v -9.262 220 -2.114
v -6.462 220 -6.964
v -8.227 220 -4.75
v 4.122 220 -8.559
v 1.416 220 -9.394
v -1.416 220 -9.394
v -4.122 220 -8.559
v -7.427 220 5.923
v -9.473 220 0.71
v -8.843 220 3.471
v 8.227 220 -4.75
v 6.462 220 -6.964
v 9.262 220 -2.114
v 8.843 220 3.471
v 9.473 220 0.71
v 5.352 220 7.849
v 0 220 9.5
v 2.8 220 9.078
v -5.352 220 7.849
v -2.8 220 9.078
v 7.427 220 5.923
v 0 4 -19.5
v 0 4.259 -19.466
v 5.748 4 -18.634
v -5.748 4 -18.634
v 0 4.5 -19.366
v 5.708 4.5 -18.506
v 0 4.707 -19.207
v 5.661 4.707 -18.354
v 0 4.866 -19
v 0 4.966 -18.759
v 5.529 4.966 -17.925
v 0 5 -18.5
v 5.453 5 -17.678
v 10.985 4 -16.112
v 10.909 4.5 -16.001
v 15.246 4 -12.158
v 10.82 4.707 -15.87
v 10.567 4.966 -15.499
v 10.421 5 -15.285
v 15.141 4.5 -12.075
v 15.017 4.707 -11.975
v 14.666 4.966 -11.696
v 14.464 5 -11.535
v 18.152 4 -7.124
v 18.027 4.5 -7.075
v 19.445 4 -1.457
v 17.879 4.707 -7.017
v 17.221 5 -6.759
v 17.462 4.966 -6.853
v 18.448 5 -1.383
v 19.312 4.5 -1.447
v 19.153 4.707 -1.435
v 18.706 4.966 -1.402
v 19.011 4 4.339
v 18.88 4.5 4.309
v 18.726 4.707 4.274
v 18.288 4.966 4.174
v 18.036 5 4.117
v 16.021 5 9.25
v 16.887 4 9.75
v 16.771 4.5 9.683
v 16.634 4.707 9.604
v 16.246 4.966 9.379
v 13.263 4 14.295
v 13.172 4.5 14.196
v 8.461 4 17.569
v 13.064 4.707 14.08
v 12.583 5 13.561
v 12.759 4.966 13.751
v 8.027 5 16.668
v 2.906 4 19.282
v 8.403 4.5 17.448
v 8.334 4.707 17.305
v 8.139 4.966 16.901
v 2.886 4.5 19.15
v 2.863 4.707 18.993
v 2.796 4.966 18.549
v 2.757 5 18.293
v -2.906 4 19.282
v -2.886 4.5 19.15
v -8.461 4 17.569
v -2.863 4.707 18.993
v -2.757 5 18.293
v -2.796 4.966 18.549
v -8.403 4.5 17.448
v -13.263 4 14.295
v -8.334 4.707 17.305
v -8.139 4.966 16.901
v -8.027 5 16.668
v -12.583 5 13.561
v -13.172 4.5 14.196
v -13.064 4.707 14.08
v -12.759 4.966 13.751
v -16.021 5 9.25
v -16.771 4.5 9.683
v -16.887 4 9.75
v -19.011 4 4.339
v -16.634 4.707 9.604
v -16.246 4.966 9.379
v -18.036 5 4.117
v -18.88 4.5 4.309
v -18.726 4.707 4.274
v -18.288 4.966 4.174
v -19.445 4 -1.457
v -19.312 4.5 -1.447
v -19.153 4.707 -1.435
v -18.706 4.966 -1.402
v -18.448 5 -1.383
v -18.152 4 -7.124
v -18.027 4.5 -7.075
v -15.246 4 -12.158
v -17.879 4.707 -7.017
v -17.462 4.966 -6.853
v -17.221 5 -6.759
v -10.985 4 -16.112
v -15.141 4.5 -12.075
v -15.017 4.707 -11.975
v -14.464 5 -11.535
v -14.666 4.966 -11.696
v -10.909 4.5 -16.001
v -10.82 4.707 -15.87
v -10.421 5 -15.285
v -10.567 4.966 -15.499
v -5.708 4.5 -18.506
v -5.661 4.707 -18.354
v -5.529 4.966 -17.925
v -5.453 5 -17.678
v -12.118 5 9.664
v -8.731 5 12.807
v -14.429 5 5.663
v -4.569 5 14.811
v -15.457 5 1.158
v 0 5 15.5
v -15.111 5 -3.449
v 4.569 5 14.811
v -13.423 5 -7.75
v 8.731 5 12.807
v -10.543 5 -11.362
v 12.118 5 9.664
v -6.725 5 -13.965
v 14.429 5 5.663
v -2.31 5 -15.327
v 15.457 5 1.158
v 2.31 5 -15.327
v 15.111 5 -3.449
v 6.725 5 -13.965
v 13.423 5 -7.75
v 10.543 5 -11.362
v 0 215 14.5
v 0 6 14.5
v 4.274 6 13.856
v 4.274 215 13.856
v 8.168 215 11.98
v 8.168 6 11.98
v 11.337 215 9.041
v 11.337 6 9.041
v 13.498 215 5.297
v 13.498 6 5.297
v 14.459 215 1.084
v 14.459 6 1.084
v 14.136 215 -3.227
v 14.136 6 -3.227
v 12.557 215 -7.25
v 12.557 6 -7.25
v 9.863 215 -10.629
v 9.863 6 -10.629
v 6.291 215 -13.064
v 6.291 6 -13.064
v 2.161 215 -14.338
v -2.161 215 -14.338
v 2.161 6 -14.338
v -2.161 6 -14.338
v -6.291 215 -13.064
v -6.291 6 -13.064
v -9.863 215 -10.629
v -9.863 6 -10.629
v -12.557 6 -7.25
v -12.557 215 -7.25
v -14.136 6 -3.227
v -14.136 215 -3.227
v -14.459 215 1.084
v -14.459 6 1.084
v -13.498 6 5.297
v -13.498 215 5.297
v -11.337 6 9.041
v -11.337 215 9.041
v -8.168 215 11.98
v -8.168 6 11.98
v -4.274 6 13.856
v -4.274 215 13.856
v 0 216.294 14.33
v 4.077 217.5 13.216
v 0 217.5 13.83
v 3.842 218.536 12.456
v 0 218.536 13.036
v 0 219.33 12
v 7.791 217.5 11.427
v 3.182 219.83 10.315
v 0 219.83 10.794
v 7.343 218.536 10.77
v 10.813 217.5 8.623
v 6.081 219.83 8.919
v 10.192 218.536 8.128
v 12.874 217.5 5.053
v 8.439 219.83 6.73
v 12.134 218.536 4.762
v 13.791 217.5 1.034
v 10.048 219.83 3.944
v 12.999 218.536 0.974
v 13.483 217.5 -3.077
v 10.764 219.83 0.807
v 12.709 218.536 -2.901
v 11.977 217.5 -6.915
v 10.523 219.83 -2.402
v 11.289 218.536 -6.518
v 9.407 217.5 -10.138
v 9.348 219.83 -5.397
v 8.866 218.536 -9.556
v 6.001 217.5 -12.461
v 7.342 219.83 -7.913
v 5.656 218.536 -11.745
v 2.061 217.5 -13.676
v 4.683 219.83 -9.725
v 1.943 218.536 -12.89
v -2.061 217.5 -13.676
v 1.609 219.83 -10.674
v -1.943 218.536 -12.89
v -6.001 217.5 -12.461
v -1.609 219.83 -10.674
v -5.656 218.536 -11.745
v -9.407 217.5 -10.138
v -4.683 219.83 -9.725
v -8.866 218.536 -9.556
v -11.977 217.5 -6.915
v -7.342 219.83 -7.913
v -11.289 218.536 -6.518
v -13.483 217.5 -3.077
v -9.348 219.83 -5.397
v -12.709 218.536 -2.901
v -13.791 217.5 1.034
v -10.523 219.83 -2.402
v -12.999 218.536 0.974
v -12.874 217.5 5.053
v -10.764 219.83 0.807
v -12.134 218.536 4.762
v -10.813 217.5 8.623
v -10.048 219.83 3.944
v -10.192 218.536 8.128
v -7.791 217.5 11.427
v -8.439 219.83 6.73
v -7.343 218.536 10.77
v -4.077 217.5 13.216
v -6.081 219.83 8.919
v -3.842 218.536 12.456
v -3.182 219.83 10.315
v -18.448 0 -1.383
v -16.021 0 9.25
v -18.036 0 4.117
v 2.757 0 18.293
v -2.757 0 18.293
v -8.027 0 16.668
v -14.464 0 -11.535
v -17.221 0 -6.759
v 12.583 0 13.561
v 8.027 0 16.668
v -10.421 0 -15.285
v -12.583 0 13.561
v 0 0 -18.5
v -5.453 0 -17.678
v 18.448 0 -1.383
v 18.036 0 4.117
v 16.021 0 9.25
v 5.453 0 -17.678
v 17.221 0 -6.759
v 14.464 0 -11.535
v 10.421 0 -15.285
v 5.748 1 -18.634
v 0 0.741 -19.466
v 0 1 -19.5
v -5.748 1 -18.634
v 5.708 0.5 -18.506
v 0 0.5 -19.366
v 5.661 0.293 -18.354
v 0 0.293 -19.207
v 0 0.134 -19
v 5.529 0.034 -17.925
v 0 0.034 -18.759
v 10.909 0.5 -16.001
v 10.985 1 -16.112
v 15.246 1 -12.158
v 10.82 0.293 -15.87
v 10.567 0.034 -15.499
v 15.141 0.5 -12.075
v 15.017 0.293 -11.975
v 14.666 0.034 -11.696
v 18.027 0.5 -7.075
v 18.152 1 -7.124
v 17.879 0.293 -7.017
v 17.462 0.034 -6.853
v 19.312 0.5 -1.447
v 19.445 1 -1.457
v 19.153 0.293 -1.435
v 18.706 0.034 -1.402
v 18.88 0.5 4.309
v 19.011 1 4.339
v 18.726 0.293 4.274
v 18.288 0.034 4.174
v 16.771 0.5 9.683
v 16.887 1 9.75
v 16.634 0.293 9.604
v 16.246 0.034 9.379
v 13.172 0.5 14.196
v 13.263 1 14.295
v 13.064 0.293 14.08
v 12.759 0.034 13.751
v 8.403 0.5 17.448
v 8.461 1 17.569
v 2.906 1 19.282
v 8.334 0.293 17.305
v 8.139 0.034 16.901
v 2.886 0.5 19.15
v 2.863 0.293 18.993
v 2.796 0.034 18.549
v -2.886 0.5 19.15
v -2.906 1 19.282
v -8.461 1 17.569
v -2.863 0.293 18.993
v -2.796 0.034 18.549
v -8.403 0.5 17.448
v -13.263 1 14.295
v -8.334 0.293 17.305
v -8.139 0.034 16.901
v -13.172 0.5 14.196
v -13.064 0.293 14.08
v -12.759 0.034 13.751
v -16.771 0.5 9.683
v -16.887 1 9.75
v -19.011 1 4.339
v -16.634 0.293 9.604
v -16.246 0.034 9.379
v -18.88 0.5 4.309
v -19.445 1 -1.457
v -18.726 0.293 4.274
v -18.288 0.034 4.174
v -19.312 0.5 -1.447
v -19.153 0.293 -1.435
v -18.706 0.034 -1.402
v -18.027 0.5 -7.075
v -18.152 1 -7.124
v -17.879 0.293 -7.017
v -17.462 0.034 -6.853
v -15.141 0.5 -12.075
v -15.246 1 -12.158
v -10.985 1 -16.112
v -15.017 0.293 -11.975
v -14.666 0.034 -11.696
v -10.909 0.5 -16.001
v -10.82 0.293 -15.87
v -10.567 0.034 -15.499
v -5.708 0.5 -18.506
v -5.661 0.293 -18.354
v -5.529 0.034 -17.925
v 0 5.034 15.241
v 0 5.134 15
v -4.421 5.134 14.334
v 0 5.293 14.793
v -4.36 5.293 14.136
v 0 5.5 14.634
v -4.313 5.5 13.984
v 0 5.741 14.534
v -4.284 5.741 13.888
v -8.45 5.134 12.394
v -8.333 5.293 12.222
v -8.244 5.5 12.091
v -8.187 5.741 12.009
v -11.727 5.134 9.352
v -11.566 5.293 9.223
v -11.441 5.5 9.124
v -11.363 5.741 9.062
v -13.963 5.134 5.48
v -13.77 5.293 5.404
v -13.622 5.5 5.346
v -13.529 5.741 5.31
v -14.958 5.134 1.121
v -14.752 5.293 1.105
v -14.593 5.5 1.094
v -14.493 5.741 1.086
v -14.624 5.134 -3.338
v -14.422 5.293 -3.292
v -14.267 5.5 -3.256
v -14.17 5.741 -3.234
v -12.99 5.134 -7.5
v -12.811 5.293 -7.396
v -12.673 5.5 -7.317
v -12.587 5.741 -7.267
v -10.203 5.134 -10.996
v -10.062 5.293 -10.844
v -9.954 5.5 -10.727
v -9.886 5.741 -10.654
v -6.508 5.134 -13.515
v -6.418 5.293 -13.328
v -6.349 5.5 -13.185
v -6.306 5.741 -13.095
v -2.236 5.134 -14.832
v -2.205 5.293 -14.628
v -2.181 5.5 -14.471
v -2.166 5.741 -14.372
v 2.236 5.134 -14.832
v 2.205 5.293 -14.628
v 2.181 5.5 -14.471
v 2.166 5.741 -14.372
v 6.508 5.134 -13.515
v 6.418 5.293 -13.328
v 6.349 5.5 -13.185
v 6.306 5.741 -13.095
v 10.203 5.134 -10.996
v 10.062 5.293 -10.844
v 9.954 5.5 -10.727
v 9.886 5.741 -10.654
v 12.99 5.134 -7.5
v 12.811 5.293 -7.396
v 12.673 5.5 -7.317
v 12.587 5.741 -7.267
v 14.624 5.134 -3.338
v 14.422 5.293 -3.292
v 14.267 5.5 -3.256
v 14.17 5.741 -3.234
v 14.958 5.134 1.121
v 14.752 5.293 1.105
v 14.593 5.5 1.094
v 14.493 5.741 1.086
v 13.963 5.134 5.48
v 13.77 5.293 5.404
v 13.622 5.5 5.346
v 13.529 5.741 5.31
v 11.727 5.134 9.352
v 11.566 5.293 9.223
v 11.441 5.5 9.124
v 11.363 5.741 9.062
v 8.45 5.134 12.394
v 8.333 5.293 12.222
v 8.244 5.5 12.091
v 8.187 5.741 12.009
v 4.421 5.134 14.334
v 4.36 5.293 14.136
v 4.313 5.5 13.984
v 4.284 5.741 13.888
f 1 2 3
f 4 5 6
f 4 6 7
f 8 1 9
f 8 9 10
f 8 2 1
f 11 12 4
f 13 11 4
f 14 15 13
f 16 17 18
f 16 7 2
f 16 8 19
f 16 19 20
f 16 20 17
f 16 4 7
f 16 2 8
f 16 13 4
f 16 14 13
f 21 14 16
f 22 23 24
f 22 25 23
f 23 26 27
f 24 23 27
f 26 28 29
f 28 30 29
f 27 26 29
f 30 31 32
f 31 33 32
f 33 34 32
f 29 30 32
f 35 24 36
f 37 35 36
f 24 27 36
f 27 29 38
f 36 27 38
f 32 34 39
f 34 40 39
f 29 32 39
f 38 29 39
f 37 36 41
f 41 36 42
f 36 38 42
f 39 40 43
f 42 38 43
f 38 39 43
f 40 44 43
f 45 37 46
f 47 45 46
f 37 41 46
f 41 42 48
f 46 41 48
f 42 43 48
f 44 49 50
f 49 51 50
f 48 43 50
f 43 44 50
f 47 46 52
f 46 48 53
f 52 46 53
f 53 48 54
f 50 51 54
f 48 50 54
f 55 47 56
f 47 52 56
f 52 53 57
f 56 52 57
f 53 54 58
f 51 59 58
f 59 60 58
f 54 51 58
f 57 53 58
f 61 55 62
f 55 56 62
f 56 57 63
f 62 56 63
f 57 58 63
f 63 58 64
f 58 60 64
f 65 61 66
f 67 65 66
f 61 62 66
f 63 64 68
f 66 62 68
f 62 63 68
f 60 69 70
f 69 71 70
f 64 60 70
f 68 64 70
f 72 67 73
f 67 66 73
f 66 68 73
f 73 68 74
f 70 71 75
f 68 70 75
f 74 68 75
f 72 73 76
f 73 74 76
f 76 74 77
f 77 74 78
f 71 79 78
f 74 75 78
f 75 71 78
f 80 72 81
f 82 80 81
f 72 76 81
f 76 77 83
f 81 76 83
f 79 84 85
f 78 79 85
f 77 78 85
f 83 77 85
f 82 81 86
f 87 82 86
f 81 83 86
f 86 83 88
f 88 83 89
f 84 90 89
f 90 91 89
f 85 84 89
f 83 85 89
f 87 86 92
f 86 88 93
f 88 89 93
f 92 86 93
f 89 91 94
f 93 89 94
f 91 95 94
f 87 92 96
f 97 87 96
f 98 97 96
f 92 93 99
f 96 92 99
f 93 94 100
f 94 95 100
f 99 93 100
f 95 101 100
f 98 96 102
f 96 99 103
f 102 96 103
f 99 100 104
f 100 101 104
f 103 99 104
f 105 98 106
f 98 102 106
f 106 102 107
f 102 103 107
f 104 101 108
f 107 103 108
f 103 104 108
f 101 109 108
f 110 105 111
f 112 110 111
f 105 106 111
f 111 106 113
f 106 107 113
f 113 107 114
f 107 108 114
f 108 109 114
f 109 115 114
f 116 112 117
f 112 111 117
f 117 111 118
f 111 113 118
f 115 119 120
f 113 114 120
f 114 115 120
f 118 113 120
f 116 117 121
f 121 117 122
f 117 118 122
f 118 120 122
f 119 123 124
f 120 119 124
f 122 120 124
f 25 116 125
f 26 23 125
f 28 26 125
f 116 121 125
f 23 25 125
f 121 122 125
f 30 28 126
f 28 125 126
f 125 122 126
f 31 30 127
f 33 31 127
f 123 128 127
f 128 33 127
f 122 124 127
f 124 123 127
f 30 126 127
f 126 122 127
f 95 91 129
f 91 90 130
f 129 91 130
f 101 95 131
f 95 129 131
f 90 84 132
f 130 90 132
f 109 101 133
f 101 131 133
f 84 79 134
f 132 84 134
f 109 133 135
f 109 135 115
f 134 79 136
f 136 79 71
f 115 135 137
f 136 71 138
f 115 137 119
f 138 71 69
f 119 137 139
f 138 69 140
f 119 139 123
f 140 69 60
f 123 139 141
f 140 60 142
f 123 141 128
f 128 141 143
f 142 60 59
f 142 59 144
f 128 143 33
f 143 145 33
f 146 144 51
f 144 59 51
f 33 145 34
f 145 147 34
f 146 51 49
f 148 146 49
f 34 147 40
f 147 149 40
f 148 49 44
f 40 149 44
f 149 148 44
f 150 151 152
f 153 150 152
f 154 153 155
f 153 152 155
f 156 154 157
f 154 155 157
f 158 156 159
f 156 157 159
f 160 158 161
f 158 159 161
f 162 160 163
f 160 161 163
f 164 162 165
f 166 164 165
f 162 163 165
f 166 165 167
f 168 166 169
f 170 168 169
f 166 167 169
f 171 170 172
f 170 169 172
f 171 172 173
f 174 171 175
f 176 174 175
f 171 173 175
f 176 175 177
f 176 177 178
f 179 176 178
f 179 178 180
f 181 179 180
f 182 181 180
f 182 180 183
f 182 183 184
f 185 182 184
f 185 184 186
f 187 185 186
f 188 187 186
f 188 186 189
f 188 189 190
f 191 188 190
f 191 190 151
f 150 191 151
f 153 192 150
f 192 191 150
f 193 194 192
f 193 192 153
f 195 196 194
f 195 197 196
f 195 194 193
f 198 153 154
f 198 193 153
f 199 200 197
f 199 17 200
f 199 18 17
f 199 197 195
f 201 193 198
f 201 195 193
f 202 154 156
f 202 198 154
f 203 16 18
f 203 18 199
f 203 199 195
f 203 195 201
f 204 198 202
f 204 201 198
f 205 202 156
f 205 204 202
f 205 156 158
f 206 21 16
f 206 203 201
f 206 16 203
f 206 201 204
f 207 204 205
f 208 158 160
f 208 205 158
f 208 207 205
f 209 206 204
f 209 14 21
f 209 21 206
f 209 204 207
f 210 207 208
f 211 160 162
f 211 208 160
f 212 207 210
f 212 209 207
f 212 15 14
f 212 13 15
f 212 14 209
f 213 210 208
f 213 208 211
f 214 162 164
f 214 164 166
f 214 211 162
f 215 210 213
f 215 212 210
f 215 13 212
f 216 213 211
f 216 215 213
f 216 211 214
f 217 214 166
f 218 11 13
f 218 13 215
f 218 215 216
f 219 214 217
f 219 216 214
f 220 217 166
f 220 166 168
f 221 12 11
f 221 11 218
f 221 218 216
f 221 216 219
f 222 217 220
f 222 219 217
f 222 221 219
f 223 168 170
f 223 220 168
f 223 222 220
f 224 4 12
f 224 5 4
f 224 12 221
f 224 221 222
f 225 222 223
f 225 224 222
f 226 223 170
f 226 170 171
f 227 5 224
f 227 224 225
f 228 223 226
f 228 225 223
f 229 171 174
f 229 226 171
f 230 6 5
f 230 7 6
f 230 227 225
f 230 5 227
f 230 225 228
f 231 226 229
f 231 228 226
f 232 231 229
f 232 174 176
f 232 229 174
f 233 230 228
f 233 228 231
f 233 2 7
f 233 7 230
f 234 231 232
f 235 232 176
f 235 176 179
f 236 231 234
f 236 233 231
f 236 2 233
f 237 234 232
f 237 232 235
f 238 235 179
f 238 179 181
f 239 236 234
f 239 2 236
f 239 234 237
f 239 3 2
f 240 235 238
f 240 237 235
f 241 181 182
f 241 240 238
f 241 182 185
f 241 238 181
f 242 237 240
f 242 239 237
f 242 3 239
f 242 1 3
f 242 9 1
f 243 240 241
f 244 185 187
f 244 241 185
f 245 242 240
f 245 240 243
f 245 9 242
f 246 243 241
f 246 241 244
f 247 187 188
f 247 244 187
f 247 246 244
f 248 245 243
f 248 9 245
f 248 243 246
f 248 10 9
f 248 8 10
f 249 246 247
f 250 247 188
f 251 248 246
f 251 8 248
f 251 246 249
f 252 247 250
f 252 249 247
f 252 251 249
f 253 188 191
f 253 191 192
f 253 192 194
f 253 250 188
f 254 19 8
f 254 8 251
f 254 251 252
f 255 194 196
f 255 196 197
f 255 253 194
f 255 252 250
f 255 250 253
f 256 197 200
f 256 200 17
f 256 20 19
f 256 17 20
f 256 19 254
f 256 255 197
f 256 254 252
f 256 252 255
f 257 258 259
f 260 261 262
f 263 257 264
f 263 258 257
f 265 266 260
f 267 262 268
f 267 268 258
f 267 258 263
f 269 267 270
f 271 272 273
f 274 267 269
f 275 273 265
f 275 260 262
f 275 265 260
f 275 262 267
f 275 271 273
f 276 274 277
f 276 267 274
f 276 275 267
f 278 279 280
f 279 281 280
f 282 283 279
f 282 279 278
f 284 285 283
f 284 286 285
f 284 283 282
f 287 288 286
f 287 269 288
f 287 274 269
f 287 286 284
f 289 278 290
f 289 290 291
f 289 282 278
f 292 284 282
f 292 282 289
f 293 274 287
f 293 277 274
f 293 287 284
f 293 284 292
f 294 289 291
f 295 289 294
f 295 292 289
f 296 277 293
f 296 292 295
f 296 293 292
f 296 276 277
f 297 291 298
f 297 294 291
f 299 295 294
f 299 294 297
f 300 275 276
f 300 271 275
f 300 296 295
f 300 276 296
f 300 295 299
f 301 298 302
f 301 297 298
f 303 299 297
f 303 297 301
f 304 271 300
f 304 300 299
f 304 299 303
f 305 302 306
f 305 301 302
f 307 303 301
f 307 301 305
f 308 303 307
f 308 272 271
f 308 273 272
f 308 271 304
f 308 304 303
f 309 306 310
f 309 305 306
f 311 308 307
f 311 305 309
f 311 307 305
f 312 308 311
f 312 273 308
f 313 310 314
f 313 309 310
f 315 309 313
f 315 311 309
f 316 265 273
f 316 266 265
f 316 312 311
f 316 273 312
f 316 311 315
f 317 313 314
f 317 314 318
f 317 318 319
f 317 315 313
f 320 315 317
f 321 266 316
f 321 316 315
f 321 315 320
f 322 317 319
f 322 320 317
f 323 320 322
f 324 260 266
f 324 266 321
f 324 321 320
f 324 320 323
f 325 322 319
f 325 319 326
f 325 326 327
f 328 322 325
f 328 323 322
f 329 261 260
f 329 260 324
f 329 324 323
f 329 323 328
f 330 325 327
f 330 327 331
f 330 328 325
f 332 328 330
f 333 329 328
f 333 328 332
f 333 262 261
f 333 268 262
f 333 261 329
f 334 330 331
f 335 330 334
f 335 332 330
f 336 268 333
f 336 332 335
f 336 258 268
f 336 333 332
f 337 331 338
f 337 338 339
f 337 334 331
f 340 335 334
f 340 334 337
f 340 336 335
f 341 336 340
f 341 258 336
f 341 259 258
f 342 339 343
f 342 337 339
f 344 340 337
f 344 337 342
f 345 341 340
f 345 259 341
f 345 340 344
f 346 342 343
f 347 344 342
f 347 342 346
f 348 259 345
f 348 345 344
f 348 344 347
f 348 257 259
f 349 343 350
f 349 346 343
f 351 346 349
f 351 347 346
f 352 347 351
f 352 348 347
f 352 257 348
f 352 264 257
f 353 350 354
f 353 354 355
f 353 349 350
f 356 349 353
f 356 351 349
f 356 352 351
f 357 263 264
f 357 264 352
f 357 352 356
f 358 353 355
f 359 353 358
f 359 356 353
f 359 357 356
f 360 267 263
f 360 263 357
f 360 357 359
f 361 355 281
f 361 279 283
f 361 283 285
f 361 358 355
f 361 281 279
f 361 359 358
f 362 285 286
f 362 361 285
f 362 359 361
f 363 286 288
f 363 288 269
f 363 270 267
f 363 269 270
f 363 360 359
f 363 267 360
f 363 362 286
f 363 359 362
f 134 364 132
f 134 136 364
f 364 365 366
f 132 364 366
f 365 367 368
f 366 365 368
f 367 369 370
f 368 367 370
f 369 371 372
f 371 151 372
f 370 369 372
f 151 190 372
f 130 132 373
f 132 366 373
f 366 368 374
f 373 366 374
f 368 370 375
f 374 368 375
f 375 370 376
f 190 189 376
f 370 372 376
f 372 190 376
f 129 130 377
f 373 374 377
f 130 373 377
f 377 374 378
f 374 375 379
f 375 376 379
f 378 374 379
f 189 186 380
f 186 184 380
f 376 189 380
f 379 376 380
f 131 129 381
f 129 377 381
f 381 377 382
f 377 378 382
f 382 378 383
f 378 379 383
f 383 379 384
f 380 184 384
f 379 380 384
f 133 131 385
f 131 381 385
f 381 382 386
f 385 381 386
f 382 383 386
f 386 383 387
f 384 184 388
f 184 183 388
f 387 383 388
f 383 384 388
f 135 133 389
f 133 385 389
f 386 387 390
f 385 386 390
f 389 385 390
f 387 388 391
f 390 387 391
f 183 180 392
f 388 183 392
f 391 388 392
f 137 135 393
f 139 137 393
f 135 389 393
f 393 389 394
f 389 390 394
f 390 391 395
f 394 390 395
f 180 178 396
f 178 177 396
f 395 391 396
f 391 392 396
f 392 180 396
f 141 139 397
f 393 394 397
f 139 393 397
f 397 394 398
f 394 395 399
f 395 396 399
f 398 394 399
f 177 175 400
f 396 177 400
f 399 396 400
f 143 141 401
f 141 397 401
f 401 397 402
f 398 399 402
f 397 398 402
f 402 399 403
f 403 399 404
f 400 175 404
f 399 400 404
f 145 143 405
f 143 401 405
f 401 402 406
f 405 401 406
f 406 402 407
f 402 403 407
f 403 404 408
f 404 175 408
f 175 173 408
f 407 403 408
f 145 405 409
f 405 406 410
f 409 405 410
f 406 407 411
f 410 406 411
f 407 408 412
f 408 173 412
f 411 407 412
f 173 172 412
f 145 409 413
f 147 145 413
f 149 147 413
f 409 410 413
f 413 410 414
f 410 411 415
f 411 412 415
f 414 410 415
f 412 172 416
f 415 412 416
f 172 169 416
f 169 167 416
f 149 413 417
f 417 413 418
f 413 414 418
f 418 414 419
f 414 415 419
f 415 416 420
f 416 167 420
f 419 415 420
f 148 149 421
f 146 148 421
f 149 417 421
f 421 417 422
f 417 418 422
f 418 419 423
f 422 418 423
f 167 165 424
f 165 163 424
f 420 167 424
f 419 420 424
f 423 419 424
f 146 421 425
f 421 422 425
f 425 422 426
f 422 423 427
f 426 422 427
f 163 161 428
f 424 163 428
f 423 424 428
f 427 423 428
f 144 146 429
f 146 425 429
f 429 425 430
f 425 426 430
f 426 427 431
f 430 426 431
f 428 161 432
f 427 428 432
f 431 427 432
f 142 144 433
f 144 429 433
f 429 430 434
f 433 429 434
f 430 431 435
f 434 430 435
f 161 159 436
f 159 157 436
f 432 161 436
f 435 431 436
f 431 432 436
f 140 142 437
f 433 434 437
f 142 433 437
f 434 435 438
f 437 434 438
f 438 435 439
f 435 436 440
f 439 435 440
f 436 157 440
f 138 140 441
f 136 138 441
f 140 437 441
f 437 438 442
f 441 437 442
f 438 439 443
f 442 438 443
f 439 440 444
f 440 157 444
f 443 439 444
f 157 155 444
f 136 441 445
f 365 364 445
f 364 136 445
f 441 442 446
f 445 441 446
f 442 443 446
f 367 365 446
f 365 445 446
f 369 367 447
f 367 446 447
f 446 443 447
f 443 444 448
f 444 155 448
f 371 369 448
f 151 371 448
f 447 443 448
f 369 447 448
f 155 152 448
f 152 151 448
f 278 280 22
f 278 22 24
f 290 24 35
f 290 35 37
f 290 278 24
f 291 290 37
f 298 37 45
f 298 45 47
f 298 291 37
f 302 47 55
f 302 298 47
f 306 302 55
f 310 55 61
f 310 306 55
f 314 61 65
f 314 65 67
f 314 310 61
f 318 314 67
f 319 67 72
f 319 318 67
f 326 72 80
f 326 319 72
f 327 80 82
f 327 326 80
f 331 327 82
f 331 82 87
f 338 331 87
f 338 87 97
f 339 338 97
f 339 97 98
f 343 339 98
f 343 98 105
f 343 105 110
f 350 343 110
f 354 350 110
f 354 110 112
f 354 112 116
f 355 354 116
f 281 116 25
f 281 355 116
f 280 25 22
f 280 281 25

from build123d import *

# Parameters (mm, degrees)
SKETCH2_R           = 14.5
BOSS_EXTRUDE1_DEPTH = 220
FILLET1_R           = 5
SKETCH3_R           = 19.5
BOSS_EXTRUDE2_DEPTH = 5
FILLET2_R           = 1


with BuildPart() as part:
    # Sketch2 → Boss-Extrude1 (new body)
    with BuildSketch(Plane(origin=(0, 0, 0), x_dir=(1, 0, 0), z_dir=(0, 1, 0))):
        with Locations(Location((0, 0, 0), (0, 0, 270))):
            Circle(SKETCH2_R)
    extrude(amount=BOSS_EXTRUDE1_DEPTH)

    # Fillet1
    fillet1_edges = [part.edges().sort_by_distance(p)[0] for p in [
        (0, 220, -14.5),
    ]]
    fillet(fillet1_edges, radius=FILLET1_R)

    # Sketch3 → Boss-Extrude2 (add)
    with BuildSketch(Plane.XZ):
        with Locations(Location((0, 0, 0), (0, 0, 270))):
            Circle(SKETCH3_R)
    extrude(amount=-BOSS_EXTRUDE2_DEPTH)

    # Fillet2
    fillet2_edges = [part.edges().sort_by_distance(p)[0] for p in [
        (0, 5, 19.5),
        (0, 0, 19.5),
        (0, 5, -14.5),
    ]]
    fillet(fillet2_edges, radius=FILLET2_R)


solid = part.part
